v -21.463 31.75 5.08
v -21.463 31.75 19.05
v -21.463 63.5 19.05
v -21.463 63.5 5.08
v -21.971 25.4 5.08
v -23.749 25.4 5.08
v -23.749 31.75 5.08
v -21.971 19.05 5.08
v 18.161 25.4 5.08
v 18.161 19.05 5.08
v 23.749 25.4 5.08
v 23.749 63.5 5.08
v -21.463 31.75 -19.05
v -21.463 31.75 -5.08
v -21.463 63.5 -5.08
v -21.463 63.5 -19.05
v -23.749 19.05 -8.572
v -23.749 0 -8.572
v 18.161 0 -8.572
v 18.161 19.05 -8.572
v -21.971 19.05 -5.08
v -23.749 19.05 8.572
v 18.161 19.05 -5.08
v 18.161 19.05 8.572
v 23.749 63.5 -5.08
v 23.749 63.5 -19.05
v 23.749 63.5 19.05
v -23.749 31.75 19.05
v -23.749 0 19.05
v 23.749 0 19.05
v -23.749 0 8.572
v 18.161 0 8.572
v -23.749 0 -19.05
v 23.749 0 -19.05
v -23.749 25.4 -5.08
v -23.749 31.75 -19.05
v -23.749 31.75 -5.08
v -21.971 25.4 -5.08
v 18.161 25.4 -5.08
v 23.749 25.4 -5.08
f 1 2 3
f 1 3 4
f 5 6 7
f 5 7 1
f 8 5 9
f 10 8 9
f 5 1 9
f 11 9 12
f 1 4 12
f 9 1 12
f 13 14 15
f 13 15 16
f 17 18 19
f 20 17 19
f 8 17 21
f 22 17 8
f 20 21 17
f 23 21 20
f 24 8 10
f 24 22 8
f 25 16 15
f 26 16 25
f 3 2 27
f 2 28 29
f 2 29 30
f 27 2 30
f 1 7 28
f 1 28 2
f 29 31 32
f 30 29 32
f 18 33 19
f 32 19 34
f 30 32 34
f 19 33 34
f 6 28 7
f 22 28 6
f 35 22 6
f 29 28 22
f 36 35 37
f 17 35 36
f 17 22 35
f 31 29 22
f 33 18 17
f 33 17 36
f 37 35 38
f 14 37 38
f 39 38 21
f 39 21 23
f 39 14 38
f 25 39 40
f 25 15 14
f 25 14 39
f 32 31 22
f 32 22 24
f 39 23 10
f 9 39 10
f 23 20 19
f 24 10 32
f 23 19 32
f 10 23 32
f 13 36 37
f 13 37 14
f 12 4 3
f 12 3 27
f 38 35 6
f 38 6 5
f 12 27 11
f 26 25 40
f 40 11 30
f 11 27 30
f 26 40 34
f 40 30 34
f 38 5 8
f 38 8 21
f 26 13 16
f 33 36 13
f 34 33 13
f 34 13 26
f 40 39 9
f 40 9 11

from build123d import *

# Parameters (mm, degrees)
SKETCH1_W           = 47.498
SKETCH1_H           = 38.1
BOSS_EXTRUDE1_DEPTH = 63.5
SKETCH3_W           = 47.498
SKETCH3_H           = 10.16
CUT_EXTRUDE1_DEPTH  = 38.1
SKETCH4_W           = 41.91
SKETCH4_H           = 17.145
CUT_EXTRUDE2_DEPTH  = 19.05
SKETCH5_W           = 40.132
SKETCH5_H           = 10.16
CUT_EXTRUDE3_DEPTH  = 49.770149692
SKETCH6_W           = 2.286
SKETCH6_H           = 38.1
CUT_EXTRUDE4_DEPTH  = 31.75


with BuildPart() as part:
    # Sketch1 → Boss-Extrude1 (new body)
    with BuildSketch(Plane(origin=(0, 0, 0), x_dir=(1, 0, 0), z_dir=(0, 1, 0))):
        Rectangle(SKETCH1_W, SKETCH1_H)
    extrude(amount=BOSS_EXTRUDE1_DEPTH)

    # Sketch3 → Cut-Extrude1 (cut)
    with BuildSketch(Plane(origin=(0, 63.5, 0), x_dir=(1, 0, 0), z_dir=(0, 1, 0))):
        Rectangle(SKETCH3_W, SKETCH3_H)
    extrude(amount=-CUT_EXTRUDE1_DEPTH, mode=Mode.SUBTRACT)

    # Sketch4 → Cut-Extrude2 (cut)
    with BuildSketch(Plane.XZ):
        with Locations((-2.794, 0)):
            Rectangle(SKETCH4_W, SKETCH4_H)
    extrude(amount=-CUT_EXTRUDE2_DEPTH, mode=Mode.SUBTRACT)

    # Sketch5 → Cut-Extrude3 (cut, through all)
    with BuildSketch(Plane(origin=(0, 25.4, 0), x_dir=(1, 0, 0), z_dir=(0, 1, 0))):
        with Locations((-1.905, 0)):
            Rectangle(SKETCH5_W, SKETCH5_H)
    extrude(amount=-CUT_EXTRUDE3_DEPTH, mode=Mode.SUBTRACT)

    # Sketch6 → Cut-Extrude4 (cut)
    with BuildSketch(Plane(origin=(0, 63.5, 0), x_dir=(1, 0, 0), z_dir=(0, 1, 0))):
        with Locations((-22.606, 0)):
            Rectangle(SKETCH6_W, SKETCH6_H)
    extrude(amount=-CUT_EXTRUDE4_DEPTH, mode=Mode.SUBTRACT)


solid = part.part
